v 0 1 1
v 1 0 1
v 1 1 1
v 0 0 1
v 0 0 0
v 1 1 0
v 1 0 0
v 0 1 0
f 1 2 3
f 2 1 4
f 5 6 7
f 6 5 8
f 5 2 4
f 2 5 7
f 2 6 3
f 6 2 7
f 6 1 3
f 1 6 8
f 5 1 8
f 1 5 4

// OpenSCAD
// part to generate
part = "holder"; // [all, holder, saber]

// size of the model
size = 50; // [10:5:100]

/* [Animation] */
// resolution
$fn = 50;

/* [Animation] */
// rotating animation
animation_rotation = false;

/* [Hidden] */
is_animated = animation_rotation;
$vpt = is_animated?[0, 0, 200]:$vpt;
$vpr = is_animated?[60, 0, animation_rotation?(365 * $t):45]:$vpr;  // animation rotate around the object
$vpd = is_animated?1000:$vpd;

if (part == "holder") {
    holder();
} else if (part == "saber") {
    saber_profile();
} else {
    saber_profile();
}

module saber_profile() {
    a = [
            [20, 0],
            [34.5, 8],
            [34.5, 17],
            [33, 0],
            [33, 34],
            [29, 0],
            [29, 4],
            [30, 0],
            [30, 13],
            [29, 0],
            [29, 4],
            [30, 0],
            [30, 13],
            [29, 0],
            [29, 4],
            [30, 0],
            [30, 13],
            [29, 0],
            [29, 4],
            [30, 0],
            [30, 13],
            [29, 0],
            [29, 4],
            [34, 33],
            [34, 25],
            [29, 4],
            [29, 35],
            [34, 15],
            [34, 14],
            [29.5, 0],
            [29.5, 6],
            [34, 45]
        ];
    b = [[0, 0], [10, 0], [17.25, 8], [17.25, 25], [16.5, 25], [15, 59], [14.5, 59], [14.5, 63], [15, 63], [15, 76], [
        14.5, 76], [14.5, 80], [15, 80], [15, 93], [14.5, 93], [14.5, 97], [15, 97], [15, 110], [14.5, 110], [14.5, 114]
        , [15, 114], [15, 127], [14.5, 127], [14.5, 131], [17, 164], [17, 189], [14.5, 193], [14.5, 228], [17, 243], [17
            , 257], [14.75, 257], [14.75, 263], [17, 263], [17, 308], [0, 308]];
    difference() {
        rotate_extrude()
            polygon(b);

        translate([15, -250 / 2, 100])
            cube(250);
        translate([-250 - 15, -250 / 2, 100])
            cube(250);

        translate([-50, 25, 332 - 50])
            rotate([55, 0, 0])
                cube(100);

        //battery charger
        translate([0, 0, 178])
            rotate([90, 0, 0])
                cylinder(d = 10, h = 35);

        // blade
        translate([0, 0, 10])
            #cylinder(d = 25.4, h = 1100);
    }

    //battery charger
    translate([0, 0, 178])
        rotate([90, 0, 0]) {
            difference() {
                cylinder(d = 10, h = 16);
                cylinder(d = 5.5, h = 18);
            }
            cylinder(d = 1, h = 16);
        }
    //button
    translate([0, 0, 163])
        rotate([90, 0, 0]) {
            cylinder(d = 14, h = 16);
            translate([0, 0, 16])
                cylinder(d1 = 14, d2 = 10.5, h = 1.5);
        }
}

module holder() {
    cube();
}
